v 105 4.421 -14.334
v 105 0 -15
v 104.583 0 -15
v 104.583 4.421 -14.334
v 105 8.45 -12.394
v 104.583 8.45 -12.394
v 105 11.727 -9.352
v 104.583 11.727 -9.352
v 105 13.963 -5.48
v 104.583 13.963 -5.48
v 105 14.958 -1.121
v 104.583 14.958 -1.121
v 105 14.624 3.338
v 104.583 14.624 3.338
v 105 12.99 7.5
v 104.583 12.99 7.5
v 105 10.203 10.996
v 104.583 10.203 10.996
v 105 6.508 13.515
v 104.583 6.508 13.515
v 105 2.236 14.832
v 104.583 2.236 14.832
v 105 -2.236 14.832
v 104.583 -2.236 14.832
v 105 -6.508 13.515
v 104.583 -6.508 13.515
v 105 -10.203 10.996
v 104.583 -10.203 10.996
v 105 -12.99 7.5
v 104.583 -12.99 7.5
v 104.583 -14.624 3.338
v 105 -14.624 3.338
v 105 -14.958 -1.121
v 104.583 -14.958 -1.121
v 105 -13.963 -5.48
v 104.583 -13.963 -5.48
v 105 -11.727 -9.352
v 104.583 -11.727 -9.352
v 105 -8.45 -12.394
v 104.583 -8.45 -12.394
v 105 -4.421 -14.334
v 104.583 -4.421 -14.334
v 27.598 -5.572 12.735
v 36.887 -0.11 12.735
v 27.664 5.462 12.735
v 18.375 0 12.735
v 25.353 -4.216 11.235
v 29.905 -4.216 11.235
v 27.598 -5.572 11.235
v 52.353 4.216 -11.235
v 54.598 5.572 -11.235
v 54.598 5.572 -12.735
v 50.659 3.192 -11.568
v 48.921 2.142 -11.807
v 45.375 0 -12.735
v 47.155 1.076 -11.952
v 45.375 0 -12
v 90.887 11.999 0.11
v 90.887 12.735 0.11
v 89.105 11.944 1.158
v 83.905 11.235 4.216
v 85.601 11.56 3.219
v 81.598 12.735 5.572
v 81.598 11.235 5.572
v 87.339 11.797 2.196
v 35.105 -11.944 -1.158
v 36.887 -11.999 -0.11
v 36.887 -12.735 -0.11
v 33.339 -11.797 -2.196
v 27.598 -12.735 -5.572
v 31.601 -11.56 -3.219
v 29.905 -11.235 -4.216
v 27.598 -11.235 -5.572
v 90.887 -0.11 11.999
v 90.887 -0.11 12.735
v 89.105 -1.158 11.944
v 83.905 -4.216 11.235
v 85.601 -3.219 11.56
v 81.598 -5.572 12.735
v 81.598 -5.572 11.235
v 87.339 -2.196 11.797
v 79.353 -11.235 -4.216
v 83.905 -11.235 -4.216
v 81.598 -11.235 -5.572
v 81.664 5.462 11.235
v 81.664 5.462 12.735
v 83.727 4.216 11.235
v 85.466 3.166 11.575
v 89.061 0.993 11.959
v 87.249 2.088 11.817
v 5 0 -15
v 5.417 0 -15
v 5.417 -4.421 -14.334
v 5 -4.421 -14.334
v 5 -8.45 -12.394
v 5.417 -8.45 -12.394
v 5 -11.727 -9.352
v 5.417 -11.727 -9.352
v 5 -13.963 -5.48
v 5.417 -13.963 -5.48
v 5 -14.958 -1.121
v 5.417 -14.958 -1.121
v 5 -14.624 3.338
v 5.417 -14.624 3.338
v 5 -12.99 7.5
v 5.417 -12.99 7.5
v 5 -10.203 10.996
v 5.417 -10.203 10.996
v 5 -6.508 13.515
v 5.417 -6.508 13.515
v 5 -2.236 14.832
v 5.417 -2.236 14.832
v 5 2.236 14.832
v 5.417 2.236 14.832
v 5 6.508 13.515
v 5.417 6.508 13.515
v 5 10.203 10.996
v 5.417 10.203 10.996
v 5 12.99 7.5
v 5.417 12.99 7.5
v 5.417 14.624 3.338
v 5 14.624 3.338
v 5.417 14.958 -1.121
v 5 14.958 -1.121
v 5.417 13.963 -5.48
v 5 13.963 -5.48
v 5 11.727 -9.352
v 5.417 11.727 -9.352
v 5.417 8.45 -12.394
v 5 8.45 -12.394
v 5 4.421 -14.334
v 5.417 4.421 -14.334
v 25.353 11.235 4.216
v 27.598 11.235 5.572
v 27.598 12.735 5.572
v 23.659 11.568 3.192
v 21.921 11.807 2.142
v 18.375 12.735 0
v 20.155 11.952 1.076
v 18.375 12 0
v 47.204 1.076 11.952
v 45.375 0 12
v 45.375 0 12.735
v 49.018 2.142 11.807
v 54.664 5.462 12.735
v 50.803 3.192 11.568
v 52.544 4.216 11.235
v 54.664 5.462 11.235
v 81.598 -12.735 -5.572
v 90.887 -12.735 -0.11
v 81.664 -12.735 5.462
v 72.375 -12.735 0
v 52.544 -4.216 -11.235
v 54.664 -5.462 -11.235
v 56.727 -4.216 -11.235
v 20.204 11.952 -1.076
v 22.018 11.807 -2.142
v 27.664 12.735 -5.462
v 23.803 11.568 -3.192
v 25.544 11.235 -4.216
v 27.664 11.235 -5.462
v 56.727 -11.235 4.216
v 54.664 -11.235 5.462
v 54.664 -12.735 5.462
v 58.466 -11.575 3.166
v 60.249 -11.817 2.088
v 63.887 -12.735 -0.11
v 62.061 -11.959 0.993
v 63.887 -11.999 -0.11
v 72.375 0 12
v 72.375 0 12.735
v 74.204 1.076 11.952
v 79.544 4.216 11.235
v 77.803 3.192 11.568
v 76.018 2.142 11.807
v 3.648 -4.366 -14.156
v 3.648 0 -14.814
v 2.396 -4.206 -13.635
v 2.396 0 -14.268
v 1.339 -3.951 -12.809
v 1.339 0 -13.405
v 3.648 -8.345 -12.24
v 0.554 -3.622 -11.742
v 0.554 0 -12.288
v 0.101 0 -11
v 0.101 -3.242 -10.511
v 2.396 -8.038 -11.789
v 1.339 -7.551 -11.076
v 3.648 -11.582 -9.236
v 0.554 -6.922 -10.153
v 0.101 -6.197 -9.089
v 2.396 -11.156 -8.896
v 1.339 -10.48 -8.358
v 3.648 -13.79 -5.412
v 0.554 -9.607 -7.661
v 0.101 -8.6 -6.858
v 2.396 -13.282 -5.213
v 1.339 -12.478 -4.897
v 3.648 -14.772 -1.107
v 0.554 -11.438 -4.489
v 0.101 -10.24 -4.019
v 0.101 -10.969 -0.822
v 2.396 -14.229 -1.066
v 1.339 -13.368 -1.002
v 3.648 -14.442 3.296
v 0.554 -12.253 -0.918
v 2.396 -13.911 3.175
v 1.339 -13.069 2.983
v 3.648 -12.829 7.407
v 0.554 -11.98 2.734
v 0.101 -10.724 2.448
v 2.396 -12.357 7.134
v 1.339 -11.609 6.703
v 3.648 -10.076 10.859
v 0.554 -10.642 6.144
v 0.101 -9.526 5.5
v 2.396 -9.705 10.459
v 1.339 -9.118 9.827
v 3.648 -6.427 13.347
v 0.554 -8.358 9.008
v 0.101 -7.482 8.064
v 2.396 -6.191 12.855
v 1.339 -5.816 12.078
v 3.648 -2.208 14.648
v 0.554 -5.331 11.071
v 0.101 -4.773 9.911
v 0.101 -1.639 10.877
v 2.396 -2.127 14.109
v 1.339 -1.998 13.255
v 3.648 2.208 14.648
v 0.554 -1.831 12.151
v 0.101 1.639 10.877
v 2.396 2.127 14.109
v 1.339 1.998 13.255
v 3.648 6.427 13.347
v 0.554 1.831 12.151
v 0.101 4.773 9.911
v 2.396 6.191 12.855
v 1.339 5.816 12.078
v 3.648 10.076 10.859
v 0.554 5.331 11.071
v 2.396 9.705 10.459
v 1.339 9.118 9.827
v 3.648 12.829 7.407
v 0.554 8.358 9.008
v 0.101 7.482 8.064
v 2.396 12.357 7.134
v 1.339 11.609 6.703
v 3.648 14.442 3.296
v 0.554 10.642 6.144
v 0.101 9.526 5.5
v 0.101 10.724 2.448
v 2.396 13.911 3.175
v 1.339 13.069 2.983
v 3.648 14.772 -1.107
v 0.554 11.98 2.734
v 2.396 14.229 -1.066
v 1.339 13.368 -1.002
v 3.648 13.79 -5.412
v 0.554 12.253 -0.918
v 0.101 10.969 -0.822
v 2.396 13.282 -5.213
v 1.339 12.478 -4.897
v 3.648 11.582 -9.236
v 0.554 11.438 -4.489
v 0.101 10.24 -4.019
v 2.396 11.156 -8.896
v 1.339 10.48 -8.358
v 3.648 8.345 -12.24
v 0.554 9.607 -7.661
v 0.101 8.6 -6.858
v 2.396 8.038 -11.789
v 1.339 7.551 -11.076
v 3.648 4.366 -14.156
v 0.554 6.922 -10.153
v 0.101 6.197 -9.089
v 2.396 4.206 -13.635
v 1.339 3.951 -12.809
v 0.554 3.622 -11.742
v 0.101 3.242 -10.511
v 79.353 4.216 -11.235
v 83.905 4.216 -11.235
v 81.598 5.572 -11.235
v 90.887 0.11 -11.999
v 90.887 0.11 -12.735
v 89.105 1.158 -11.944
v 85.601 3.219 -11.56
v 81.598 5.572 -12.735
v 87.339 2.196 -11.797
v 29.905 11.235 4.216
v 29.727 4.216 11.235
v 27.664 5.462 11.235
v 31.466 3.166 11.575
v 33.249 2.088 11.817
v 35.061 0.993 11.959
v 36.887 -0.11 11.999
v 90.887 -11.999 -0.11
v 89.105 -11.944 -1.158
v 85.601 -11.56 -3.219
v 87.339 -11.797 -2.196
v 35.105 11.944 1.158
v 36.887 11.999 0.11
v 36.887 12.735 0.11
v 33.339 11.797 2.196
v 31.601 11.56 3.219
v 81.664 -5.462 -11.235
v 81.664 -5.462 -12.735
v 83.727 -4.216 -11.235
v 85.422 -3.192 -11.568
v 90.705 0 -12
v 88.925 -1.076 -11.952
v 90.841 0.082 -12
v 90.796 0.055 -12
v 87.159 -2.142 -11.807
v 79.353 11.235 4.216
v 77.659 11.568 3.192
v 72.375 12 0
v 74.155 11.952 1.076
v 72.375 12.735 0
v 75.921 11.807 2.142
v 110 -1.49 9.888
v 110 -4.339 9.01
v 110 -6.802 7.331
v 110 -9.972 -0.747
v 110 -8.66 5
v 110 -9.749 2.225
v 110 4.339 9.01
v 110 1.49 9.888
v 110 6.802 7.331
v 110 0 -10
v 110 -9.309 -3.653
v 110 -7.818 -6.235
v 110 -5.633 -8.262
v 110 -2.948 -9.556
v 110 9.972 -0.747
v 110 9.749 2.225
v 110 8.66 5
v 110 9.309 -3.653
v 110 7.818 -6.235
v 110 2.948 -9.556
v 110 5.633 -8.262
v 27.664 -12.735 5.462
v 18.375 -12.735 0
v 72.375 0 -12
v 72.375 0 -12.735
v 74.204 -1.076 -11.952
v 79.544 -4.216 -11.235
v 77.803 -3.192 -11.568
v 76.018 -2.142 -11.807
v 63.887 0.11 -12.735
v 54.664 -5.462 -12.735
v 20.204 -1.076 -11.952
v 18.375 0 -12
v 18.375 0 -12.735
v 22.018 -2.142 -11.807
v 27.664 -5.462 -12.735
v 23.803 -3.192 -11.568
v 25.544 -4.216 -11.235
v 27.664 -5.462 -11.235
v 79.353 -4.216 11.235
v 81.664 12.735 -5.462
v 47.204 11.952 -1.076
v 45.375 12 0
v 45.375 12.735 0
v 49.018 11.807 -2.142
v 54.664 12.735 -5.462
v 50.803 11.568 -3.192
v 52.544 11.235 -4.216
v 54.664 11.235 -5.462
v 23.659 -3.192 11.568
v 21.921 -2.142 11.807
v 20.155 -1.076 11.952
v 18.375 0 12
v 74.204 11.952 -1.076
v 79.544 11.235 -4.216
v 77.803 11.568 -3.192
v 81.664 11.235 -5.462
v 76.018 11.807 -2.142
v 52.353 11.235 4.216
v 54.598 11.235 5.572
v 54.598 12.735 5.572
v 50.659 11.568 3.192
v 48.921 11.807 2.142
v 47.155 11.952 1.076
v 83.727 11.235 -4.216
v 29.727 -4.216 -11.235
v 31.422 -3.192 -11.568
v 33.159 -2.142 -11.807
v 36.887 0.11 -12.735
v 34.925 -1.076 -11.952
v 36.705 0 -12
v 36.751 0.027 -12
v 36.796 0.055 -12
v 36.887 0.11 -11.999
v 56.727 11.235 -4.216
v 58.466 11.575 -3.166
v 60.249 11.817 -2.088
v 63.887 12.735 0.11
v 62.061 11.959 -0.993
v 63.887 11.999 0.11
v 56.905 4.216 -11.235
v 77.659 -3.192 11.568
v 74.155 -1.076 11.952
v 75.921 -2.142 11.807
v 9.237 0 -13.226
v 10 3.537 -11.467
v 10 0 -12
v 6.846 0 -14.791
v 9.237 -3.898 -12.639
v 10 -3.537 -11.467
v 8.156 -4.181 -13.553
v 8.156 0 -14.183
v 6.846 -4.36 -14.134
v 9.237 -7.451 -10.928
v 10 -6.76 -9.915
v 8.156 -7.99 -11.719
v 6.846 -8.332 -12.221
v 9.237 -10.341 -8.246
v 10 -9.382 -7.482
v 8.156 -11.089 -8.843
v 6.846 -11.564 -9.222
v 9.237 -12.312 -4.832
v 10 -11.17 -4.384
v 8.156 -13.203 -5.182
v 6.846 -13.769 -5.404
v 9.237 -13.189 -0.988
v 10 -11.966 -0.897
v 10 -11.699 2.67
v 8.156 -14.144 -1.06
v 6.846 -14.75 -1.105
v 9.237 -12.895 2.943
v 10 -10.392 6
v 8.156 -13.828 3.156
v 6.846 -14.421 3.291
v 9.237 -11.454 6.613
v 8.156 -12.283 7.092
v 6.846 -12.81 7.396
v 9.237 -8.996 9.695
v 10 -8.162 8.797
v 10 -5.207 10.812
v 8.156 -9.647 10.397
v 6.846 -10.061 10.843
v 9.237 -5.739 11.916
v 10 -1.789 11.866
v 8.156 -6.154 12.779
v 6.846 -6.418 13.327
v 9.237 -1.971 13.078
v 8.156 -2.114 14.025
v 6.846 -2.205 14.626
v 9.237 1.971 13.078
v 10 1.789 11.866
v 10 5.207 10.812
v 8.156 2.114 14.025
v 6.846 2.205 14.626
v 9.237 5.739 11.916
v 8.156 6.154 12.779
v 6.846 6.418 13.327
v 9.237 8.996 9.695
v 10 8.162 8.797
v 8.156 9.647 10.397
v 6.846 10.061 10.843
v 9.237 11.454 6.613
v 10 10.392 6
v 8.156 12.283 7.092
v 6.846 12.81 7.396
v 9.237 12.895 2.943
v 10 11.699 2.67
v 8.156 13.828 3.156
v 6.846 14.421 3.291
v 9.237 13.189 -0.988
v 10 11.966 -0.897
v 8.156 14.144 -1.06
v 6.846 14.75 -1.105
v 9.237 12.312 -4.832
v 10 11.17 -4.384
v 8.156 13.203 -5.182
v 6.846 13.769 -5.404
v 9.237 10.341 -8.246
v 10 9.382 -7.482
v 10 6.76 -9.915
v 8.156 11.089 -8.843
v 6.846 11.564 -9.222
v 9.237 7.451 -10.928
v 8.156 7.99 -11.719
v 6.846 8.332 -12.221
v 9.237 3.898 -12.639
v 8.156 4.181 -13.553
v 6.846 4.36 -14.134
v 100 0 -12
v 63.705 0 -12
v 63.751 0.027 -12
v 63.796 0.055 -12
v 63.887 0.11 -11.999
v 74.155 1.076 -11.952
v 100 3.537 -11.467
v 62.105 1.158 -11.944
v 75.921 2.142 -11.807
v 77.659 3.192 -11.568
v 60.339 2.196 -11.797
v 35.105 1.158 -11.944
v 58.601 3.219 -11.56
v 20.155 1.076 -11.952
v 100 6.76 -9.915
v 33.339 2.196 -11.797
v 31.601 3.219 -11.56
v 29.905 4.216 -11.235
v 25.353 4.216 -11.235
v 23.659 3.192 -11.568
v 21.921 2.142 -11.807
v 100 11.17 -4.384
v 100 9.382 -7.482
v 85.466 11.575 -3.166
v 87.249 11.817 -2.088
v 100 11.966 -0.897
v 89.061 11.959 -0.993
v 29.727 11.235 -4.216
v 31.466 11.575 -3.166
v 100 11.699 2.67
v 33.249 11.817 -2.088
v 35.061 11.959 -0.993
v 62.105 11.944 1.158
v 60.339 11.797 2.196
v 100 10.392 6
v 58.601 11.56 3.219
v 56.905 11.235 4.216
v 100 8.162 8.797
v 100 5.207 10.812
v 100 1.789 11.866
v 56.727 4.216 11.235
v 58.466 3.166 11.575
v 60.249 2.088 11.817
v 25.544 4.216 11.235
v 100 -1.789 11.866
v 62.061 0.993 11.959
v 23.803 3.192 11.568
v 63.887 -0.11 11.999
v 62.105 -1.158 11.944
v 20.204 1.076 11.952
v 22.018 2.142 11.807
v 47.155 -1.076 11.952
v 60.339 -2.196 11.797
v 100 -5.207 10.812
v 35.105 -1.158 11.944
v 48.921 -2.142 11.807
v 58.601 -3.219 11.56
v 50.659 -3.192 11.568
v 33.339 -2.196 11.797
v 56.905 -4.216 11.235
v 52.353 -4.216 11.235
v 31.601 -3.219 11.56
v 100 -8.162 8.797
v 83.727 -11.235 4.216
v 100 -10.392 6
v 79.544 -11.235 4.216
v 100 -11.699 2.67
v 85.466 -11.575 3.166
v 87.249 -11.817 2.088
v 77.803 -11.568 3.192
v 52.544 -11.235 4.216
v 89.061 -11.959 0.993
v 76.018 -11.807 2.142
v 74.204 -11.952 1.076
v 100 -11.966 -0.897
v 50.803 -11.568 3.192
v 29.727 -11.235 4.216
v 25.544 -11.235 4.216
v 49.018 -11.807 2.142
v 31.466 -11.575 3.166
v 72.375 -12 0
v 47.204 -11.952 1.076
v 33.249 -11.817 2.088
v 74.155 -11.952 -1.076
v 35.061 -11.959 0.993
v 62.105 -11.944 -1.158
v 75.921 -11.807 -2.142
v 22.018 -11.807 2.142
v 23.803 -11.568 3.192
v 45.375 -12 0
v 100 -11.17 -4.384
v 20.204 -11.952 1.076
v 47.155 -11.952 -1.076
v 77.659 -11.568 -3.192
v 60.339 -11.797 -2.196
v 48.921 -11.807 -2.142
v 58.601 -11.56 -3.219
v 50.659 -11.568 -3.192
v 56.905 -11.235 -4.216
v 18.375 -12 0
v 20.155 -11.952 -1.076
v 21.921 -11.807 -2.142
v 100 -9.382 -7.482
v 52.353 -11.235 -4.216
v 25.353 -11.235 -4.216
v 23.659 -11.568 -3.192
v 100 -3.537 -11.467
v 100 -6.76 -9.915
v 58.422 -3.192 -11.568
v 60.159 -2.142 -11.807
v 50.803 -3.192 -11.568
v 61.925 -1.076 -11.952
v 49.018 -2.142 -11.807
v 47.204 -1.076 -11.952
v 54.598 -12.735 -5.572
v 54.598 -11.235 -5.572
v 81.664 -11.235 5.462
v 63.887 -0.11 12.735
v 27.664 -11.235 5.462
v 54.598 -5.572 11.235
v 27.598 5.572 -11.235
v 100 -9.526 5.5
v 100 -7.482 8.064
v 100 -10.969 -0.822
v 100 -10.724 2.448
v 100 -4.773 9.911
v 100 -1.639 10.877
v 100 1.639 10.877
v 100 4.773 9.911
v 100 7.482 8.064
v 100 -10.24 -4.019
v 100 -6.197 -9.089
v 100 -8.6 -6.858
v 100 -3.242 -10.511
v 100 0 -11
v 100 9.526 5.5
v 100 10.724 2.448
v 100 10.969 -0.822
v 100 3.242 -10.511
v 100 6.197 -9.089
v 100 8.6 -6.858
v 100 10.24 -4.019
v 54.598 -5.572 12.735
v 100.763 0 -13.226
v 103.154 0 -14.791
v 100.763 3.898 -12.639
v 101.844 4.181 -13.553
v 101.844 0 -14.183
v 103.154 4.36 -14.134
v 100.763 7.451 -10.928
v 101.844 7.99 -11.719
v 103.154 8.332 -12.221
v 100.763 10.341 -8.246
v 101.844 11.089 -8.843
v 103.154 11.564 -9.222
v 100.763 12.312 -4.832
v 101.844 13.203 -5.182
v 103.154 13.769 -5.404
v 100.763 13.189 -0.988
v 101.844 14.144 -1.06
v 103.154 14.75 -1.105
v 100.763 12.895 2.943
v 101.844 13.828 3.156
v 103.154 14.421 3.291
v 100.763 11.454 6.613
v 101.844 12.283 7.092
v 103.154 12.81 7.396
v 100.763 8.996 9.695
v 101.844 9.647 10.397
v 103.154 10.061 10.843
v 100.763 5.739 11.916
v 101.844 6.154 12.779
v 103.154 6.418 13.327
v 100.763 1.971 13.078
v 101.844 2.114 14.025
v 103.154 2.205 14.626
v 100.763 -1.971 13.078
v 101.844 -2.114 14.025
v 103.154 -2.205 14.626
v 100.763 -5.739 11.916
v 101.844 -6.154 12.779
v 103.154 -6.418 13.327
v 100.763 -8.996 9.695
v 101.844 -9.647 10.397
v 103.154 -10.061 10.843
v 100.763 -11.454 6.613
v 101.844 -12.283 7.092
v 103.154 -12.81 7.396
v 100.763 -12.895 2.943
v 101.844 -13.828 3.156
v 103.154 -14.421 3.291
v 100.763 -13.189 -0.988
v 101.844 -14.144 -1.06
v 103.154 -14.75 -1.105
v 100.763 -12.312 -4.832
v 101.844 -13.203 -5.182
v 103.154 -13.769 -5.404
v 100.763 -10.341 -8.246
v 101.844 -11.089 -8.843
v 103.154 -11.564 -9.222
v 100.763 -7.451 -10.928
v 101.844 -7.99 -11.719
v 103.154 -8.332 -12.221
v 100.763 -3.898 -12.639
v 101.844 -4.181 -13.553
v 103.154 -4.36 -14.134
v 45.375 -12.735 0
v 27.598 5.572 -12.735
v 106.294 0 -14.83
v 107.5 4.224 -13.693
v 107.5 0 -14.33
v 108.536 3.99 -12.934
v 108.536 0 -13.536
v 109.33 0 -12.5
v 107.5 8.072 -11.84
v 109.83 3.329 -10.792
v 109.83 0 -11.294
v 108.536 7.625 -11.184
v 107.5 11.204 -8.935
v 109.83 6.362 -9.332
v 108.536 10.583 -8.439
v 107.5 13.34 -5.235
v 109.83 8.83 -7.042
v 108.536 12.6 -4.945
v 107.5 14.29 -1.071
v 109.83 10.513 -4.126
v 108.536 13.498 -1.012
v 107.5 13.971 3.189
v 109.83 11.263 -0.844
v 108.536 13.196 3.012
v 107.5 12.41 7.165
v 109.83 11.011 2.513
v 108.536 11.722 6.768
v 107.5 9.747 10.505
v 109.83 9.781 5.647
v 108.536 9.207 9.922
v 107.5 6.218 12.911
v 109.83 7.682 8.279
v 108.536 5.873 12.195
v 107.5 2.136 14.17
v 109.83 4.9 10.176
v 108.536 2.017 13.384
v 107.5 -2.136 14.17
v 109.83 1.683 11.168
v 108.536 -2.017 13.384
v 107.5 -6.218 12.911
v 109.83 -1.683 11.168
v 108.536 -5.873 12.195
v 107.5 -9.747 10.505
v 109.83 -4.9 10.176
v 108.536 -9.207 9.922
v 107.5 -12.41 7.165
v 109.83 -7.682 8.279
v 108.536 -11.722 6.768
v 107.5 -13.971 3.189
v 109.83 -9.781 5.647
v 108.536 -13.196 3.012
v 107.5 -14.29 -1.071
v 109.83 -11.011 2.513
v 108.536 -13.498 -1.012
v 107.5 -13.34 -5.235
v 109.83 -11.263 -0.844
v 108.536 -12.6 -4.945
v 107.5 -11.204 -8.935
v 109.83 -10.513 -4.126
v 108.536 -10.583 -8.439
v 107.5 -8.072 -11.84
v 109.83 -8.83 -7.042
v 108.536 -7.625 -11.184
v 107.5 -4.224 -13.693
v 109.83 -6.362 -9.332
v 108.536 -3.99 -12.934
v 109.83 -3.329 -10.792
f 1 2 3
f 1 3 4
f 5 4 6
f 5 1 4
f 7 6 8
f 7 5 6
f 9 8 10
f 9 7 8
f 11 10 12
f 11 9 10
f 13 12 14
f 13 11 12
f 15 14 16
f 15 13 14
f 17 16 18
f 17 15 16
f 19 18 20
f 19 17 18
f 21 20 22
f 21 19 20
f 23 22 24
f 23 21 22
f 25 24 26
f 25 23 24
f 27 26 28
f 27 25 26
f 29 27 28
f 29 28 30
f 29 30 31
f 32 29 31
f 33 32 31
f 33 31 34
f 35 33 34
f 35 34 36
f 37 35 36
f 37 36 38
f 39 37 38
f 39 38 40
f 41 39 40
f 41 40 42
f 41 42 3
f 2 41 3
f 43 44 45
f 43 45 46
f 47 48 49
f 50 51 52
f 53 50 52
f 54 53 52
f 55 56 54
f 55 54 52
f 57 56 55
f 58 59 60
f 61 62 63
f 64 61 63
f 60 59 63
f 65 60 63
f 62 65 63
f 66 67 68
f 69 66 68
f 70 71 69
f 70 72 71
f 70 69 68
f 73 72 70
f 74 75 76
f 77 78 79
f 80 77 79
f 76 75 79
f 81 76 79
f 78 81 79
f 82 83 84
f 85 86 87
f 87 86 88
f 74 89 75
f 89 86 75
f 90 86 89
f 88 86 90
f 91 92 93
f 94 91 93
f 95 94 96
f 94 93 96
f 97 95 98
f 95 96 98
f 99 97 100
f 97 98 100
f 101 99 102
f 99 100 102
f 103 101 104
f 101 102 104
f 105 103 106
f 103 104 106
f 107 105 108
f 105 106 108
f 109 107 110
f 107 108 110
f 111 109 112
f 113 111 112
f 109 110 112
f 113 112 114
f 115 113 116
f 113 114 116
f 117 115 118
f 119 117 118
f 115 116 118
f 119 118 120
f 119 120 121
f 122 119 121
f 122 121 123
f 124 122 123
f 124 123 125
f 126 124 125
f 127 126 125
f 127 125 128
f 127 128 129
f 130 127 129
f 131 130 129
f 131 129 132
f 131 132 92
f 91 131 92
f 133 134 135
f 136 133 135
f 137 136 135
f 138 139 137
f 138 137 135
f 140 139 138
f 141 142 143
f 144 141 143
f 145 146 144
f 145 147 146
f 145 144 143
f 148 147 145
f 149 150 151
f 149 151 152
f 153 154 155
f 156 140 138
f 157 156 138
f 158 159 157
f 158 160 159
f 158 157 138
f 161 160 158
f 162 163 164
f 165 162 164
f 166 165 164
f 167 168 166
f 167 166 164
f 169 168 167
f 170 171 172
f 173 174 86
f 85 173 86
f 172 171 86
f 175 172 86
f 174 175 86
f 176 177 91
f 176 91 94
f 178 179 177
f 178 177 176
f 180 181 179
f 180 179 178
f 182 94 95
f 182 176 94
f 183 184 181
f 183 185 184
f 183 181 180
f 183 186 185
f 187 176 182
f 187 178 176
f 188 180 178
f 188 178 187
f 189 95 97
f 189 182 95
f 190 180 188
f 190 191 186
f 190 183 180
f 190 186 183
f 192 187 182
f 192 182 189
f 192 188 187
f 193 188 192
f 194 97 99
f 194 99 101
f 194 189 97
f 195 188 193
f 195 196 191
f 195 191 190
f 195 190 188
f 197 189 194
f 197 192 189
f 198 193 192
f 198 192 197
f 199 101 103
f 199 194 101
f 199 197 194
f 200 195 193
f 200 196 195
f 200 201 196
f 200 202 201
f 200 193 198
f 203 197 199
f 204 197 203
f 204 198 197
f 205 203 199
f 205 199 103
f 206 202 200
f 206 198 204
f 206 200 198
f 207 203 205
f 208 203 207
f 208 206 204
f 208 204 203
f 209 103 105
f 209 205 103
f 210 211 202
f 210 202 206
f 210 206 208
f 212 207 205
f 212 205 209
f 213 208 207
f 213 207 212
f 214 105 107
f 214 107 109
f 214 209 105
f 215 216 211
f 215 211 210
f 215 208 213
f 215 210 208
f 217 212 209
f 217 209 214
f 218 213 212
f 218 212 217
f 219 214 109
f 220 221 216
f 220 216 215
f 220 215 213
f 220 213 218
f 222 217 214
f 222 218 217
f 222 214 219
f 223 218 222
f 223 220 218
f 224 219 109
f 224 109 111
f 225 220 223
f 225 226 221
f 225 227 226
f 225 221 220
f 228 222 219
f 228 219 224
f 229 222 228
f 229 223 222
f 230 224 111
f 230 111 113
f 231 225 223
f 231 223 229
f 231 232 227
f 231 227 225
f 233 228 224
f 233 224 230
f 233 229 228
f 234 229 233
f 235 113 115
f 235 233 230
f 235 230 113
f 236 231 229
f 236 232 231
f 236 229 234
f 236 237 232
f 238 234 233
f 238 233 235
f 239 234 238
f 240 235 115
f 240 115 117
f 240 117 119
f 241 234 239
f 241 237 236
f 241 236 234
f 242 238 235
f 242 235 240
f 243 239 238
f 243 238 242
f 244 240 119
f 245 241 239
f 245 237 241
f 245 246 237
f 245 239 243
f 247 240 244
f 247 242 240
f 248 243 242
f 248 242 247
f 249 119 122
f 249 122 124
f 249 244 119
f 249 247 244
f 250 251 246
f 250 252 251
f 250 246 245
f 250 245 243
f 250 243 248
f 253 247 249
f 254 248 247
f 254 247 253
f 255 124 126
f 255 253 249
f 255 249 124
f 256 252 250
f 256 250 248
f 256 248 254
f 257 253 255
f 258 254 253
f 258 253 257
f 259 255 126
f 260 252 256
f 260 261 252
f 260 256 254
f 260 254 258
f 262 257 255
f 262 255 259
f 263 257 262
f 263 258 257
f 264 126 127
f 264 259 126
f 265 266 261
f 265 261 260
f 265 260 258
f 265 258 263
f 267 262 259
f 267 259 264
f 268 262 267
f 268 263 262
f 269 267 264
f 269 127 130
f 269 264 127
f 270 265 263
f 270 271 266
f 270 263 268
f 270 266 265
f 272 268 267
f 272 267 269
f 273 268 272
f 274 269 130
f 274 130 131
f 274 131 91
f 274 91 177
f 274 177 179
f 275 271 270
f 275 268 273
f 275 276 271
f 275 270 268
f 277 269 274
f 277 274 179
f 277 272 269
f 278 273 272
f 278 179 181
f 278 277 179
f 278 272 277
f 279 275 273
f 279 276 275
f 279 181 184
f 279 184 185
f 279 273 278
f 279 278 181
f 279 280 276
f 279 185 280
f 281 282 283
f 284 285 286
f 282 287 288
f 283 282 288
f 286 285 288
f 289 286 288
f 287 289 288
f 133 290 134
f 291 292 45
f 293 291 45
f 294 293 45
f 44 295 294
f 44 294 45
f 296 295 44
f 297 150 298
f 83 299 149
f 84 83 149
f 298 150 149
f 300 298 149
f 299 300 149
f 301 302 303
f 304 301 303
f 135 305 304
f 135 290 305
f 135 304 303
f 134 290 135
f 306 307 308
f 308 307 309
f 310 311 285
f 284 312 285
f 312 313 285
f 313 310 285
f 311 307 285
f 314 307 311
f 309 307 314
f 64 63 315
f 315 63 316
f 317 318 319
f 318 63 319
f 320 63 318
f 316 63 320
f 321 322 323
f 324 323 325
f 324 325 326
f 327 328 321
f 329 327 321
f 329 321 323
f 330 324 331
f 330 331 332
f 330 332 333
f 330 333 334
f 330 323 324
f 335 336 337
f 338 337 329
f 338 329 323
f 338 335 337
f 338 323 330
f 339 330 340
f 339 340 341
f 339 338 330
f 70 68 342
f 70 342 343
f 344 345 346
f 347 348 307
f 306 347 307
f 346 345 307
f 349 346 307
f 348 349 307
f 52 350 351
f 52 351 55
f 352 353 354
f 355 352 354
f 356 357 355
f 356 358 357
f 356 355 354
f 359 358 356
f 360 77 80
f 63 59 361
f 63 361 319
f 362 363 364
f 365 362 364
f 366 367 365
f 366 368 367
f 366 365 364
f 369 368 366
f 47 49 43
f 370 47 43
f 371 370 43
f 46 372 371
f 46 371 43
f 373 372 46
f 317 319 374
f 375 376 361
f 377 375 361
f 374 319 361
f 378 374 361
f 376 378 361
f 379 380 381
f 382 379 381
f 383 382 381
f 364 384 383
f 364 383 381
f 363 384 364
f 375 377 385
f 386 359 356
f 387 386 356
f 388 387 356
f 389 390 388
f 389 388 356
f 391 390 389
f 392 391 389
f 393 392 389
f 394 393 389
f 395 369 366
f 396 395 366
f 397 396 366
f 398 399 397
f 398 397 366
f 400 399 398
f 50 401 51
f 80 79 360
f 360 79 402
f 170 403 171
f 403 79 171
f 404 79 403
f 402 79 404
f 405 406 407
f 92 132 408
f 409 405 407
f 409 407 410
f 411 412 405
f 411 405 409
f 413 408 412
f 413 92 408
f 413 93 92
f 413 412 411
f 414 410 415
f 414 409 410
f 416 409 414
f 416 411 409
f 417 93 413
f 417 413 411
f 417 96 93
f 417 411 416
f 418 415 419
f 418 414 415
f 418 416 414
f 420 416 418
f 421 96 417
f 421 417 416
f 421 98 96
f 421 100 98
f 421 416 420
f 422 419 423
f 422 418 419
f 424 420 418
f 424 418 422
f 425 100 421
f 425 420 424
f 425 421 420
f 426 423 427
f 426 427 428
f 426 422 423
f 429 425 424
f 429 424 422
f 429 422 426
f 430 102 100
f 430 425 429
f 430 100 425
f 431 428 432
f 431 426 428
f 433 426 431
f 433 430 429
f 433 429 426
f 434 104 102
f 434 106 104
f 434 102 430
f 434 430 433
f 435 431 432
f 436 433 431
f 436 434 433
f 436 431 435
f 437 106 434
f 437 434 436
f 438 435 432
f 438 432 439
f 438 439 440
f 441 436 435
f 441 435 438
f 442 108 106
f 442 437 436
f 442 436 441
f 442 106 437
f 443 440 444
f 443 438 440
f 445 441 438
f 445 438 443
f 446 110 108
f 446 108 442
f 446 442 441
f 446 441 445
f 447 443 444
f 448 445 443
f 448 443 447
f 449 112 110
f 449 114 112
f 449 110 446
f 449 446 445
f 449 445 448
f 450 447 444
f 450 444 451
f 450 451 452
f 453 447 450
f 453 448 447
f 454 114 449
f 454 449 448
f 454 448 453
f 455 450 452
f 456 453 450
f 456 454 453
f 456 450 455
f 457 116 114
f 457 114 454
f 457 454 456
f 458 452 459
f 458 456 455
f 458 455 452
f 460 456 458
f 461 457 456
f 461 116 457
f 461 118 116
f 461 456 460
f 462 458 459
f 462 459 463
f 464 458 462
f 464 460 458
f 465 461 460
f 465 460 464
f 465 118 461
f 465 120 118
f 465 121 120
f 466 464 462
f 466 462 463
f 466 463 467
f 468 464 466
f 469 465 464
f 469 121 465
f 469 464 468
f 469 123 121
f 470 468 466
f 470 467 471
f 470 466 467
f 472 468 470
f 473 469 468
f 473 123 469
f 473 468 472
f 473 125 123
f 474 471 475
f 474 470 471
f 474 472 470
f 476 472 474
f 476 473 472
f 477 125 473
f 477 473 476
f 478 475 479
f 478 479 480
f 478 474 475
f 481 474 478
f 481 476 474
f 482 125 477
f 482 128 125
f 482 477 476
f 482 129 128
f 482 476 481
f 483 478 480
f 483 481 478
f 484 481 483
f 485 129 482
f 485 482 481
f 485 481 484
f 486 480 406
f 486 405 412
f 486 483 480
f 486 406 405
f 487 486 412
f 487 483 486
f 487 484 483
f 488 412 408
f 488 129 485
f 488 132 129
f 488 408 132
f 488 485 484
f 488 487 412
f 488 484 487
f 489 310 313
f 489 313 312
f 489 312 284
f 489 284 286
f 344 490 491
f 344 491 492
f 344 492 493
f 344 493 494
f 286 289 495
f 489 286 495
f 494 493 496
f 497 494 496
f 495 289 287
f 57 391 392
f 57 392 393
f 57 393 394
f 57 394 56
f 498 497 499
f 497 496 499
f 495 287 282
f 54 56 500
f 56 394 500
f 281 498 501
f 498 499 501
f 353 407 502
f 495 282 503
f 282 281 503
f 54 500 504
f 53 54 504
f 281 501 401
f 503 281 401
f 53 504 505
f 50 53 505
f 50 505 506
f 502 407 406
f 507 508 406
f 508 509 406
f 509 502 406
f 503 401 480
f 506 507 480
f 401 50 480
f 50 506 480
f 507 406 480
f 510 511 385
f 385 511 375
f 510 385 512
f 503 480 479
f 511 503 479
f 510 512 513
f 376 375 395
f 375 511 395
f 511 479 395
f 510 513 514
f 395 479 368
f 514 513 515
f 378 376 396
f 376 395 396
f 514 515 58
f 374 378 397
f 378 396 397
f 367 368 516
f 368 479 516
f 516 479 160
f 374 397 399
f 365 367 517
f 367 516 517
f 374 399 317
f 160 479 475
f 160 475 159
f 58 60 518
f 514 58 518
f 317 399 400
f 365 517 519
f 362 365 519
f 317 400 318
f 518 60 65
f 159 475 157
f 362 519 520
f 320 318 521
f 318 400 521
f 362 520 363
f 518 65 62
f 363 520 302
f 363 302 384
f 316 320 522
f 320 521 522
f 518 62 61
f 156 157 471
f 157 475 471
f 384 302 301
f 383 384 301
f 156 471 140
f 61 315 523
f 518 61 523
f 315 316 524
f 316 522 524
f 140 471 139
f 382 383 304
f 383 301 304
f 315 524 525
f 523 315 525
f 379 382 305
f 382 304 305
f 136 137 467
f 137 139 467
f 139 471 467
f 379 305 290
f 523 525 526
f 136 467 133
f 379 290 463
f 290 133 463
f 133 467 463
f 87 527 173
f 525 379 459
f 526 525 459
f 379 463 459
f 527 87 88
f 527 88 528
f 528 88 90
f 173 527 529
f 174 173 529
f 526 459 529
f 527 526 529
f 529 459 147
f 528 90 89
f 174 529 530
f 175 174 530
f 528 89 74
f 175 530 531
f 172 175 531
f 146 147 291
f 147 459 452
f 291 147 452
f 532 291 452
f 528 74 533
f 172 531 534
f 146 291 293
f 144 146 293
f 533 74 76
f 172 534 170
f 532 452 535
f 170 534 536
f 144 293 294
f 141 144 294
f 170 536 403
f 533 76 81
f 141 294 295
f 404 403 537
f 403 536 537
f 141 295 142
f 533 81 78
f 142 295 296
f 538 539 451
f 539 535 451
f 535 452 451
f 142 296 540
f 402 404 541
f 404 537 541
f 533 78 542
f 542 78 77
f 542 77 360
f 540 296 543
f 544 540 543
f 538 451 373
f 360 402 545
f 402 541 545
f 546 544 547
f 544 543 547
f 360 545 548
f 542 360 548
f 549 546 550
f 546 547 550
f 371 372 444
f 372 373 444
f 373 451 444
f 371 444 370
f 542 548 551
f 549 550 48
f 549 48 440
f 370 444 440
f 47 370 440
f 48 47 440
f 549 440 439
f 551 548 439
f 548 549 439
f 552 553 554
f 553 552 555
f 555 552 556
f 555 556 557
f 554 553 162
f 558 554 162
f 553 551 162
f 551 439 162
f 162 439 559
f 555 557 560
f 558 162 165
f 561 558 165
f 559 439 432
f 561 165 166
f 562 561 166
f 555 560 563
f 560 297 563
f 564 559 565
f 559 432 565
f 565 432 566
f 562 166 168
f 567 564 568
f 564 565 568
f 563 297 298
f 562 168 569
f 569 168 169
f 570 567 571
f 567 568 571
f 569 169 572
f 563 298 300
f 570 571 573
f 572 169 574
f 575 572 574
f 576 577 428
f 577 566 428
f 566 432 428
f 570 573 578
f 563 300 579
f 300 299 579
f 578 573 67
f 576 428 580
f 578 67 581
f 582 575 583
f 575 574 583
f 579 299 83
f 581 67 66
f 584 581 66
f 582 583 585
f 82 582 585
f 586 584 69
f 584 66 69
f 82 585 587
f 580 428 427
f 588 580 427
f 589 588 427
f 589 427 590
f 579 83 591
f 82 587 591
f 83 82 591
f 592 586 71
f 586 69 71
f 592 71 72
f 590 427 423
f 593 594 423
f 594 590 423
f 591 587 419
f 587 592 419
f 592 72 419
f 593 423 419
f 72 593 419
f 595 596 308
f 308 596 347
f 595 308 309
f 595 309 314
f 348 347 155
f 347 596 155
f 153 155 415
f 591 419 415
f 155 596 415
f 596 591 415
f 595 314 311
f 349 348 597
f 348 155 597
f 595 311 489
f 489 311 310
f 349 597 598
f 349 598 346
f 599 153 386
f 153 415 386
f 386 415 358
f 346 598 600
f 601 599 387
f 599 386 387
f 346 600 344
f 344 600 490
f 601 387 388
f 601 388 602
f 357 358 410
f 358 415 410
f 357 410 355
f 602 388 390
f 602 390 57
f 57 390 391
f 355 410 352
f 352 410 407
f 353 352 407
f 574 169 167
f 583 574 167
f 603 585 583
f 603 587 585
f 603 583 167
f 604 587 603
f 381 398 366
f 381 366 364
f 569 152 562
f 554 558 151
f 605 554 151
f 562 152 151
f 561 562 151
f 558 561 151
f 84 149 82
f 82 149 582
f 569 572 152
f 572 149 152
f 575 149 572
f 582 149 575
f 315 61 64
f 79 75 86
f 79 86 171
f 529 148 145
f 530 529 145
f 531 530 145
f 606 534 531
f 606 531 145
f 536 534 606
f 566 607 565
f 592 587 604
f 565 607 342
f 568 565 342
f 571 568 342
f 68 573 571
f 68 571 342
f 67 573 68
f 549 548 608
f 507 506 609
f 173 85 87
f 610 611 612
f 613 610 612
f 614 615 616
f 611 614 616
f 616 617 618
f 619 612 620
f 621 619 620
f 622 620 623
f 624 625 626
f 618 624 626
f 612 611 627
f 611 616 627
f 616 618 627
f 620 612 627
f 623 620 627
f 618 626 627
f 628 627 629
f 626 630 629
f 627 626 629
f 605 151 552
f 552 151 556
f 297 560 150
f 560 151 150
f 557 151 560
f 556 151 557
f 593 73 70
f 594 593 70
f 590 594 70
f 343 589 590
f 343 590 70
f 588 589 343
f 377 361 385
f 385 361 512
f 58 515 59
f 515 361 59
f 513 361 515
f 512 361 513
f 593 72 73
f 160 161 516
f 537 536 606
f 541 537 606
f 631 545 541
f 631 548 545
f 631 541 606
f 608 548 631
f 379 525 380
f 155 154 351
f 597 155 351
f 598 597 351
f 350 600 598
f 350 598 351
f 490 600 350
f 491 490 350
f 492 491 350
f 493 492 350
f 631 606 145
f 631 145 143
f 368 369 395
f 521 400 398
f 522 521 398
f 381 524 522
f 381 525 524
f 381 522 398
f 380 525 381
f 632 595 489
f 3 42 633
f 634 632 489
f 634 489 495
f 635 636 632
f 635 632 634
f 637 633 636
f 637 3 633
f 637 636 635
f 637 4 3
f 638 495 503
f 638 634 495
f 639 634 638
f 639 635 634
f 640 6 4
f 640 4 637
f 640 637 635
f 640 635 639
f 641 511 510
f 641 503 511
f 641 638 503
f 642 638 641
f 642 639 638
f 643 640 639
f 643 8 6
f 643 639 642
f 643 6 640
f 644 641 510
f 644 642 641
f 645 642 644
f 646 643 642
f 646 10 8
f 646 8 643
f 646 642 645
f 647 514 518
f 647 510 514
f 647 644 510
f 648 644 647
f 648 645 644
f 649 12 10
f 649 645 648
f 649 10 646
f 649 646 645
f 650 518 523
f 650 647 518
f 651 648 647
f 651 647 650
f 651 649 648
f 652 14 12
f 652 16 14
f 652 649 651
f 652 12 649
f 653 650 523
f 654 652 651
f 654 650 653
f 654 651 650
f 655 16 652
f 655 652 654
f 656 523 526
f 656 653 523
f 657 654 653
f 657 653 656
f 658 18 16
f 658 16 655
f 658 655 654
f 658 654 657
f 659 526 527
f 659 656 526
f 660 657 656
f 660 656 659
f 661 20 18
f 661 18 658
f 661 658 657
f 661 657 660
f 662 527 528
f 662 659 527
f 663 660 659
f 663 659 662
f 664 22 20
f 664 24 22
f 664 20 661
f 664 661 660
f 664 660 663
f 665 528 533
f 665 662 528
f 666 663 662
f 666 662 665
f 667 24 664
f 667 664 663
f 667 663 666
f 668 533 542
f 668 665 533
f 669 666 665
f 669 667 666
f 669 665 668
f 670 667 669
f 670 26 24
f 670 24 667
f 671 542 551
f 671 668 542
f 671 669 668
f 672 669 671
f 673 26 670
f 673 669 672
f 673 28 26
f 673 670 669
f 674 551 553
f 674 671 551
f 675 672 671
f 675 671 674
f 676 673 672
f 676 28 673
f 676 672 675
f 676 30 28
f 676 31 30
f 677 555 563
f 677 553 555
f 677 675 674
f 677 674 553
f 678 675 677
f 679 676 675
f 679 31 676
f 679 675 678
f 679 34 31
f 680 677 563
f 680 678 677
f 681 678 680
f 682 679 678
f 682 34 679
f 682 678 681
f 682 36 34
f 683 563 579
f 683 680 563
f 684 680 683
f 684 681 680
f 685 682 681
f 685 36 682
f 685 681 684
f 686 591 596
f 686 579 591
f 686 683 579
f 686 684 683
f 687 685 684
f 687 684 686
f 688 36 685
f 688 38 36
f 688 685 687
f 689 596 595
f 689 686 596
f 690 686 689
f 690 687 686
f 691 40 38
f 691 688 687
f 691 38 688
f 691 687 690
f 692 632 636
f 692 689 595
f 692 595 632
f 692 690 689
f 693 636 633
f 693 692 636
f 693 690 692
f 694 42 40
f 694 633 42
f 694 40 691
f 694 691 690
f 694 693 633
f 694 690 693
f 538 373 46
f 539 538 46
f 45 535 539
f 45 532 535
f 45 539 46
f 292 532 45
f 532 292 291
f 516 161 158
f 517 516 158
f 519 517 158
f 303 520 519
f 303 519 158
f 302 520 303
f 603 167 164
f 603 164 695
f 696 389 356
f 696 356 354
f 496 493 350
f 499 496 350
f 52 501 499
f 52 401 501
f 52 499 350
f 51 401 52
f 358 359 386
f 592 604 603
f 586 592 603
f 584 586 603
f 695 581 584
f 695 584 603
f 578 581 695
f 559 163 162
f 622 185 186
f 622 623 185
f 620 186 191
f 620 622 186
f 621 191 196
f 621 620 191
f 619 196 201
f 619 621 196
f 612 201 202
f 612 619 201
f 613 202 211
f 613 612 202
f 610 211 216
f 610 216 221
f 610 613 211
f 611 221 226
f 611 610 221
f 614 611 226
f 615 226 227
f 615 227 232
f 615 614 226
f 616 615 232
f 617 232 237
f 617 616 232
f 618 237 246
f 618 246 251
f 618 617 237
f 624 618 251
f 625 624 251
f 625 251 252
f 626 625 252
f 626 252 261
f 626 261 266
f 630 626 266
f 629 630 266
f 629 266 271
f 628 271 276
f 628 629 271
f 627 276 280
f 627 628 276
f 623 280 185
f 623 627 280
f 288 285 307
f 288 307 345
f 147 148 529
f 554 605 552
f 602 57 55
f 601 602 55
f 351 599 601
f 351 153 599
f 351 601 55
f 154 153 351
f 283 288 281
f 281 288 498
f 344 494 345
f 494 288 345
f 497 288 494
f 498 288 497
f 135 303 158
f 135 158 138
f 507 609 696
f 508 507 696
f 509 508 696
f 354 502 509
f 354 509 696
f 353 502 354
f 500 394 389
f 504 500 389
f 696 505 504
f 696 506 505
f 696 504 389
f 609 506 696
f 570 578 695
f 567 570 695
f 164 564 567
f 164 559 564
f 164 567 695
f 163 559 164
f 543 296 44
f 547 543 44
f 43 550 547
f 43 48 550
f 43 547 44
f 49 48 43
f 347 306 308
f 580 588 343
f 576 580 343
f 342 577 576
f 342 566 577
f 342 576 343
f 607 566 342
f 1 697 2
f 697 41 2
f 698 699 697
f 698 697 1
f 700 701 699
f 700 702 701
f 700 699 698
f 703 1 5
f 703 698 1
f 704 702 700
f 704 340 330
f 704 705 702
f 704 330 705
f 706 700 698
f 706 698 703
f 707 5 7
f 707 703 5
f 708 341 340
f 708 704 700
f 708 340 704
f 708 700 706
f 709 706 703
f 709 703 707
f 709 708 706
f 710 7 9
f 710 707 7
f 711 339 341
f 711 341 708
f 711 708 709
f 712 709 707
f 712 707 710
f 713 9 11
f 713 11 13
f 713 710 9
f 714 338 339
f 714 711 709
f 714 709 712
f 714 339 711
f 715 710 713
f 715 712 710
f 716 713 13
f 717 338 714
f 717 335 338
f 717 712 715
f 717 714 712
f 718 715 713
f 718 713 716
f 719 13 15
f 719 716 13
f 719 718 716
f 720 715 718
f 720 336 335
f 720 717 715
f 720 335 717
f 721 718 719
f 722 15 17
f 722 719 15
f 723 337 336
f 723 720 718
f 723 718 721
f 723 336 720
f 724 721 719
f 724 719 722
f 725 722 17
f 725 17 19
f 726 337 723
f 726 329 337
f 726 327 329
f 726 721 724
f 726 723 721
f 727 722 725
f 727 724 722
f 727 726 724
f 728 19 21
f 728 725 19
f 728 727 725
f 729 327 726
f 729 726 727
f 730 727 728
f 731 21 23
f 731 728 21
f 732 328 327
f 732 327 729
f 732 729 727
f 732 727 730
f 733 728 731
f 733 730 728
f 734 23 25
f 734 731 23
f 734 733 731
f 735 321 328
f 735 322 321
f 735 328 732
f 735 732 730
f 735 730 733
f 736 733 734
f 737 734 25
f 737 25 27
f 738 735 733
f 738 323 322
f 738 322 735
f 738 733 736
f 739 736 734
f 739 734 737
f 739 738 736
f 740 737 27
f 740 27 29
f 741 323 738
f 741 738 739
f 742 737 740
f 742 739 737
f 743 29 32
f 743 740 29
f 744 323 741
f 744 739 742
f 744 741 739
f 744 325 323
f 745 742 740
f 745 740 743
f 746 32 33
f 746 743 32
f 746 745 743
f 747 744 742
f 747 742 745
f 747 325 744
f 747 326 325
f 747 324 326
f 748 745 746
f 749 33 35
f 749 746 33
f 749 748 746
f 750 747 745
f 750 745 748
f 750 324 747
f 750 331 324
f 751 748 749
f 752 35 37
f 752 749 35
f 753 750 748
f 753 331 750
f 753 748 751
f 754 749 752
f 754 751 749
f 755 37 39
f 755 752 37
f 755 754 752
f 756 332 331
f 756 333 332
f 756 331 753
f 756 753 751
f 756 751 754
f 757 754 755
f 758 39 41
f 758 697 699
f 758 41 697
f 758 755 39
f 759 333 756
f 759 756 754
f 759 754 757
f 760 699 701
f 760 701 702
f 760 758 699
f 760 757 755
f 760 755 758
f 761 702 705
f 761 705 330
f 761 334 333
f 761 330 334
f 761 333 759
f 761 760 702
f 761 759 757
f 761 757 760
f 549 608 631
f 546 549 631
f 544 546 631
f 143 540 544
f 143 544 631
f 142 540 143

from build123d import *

# Parameters (mm, degrees)
CROQUIS1_R              = 12
SALIENTE_EXTRUIR1_DEPTH = 110
CROQUIS3_R              = 11
CORTAR_EXTRUIR1_DEPTH   = 110
CROQUIS4_R              = 15
SALIENTE_EXTRUIR3_DEPTH = 10
REDONDEO1_R             = 5
SALIENTE_EXTRUIR4_START = -10
CROQUIS5_R              = 15
SALIENTE_EXTRUIR4_DEPTH = 10
REDONDEO2_R             = 5
CORTAR_EXTRUIR2_START   = -100
CROQUIS7_R              = 11
CORTAR_EXTRUIR2_DEPTH   = 100
SALIENTE_EXTRUIR5_DEPTH = 0.75
MATRIZC1_COUNT          = 4


with BuildPart() as part:
    # Croquis1 → Saliente-Extruir1 (new body)
    with BuildSketch(Plane(origin=(0, 0, 0), x_dir=(0, 0, -1), z_dir=(1, 0, 0))):
        Circle(CROQUIS1_R)
    extrude(amount=SALIENTE_EXTRUIR1_DEPTH)

    # Croquis3 → Cortar-Extruir1 (cut)
    with BuildSketch(Plane(origin=(110, 0, 0), x_dir=(0, 0, -1), z_dir=(1, 0, 0))):
        Circle(CROQUIS3_R)
    extrude(amount=-CORTAR_EXTRUIR1_DEPTH, mode=Mode.SUBTRACT)

    # Croquis4 → Saliente-Extruir3 (add)
    with BuildSketch(Plane(origin=(110, 0, 0), x_dir=(0, 0, -1), z_dir=(1, 0, 0))):
        Circle(CROQUIS4_R)
    extrude(amount=-SALIENTE_EXTRUIR3_DEPTH)

    # Redondeo1
    # the kernel refuses this fillet: 5 mm, written as the material it takes off along each edge
    with BuildSketch(Plane(origin=(110, 0, 0), x_dir=(0, 0, -1), z_dir=(0, -1, 0))) as redondeo1_piece_1:
        with BuildLine():
            CenterArc((15 - REDONDEO1_R, -REDONDEO1_R), REDONDEO1_R, 0, 90)
            Line((15 - REDONDEO1_R, 0), (15 - REDONDEO1_R, REDONDEO1_R * 0.02))
            Line((15 - REDONDEO1_R, REDONDEO1_R * 0.02), (15 + REDONDEO1_R * 0.02, REDONDEO1_R * 0.02))
            Line((15 + REDONDEO1_R * 0.02, REDONDEO1_R * 0.02), (15 + REDONDEO1_R * 0.02, -REDONDEO1_R))
            Line((15 + REDONDEO1_R * 0.02, -REDONDEO1_R), (15, -REDONDEO1_R))
        make_face()
    revolve(axis=Axis((110, 0, 0), (1, 0, 0)), mode=Mode.SUBTRACT)
    with BuildSketch(Plane(origin=(100, 0, 0), x_dir=(0, 0, -1), z_dir=(0, -1, 0))) as redondeo1_piece_2:
        with BuildLine():
            CenterArc((10, 4.582575695), REDONDEO1_R, 293.578178478, 66.421821522)
            Line((15, 4.582575695), (15.1, 4.582575695))
            Line((15.1, 4.582575695), (15.1, 0))
            Line((15.1, 0), (15, -0.1))
            ThreePointArc((15, -0.1), (13.5, -0.1), (12.04, -0.091651514))
            Line((12.04, -0.091651514), (12, 0))
        make_face()
    revolve(axis=Axis((100, 0, 0), (1, 0, 0)), mode=Mode.SUBTRACT)

    # Croquis5 → Saliente-Extruir4 (add)
    with BuildSketch(Plane.ZY.offset(SALIENTE_EXTRUIR4_START)):
        with Locations(Location((0, 0, 0), (0, 0, 180))):
            Circle(CROQUIS5_R)
    extrude(amount=SALIENTE_EXTRUIR4_DEPTH)

    # Redondeo2
    # the kernel refuses this fillet: 5 mm, written as the material it takes off along each edge
    with BuildSketch(Plane(origin=(0, 0, 0), x_dir=(0, 0, -1), z_dir=(0, 1, 0))) as redondeo2_piece_1:
        with BuildLine():
            CenterArc((15 - REDONDEO2_R, -REDONDEO2_R), REDONDEO2_R, 0, 90)
            Line((15, -REDONDEO2_R), (15 + REDONDEO2_R * 0.02, -REDONDEO2_R))
            Line((15 + REDONDEO2_R * 0.02, -REDONDEO2_R), (15 + REDONDEO2_R * 0.02, REDONDEO2_R * 0.02))
            Line((15 + REDONDEO2_R * 0.02, REDONDEO2_R * 0.02), (15 - REDONDEO2_R, REDONDEO2_R * 0.02))
            Line((15 - REDONDEO2_R, REDONDEO2_R * 0.02), (15 - REDONDEO2_R, 0))
        make_face()
    revolve(axis=Axis((0, 0, 0), (-1, 0, 0)), mode=Mode.SUBTRACT)
    with BuildSketch(Plane(origin=(10, 0, 0), x_dir=(0, 0, -1), z_dir=(0, 1, 0))) as redondeo2_piece_2:
        with BuildLine():
            CenterArc((10, 4.582575695), REDONDEO2_R, 293.578178478, 66.421821522)
            Line((12, 0), (12.04, -0.091651514))
            ThreePointArc((12.04, -0.091651514), (13.5, -0.1), (15, -0.1))
            Line((15, -0.1), (15.1, 0))
            Line((15.1, 0), (15.1, 4.582575695))
            Line((15.1, 4.582575695), (15, 4.582575695))
        make_face()
    revolve(axis=Axis((10, 0, 0), (-1, 0, 0)), mode=Mode.SUBTRACT)

    # Croquis7 → Cortar-Extruir2 (cut)
    with BuildSketch(Plane.ZY.offset(CORTAR_EXTRUIR2_START)):
        with Locations(Location((0, 0, 0), (0, 0, 180))):
            Circle(CROQUIS7_R)
    extrude(amount=CORTAR_EXTRUIR2_DEPTH, mode=Mode.SUBTRACT)

    # Croquis9 → Saliente-Extruir5 (add, symmetric)
    with BuildSketch(Plane.XY.offset(11.985010852)):
        Polygon((18.375194252, 0), (27.66376902, 5.462495064), (36.886888429, -0.109806246), (27.598313662, -5.57230131), align=None)
        Polygon((45.375194252, 0), (54.66376902, 5.462495064), (63.886888429, -0.109806246), (54.598313662, -5.57230131), align=None)
        Polygon((72.375194252, 0), (81.66376902, 5.462495064), (90.886888429, -0.109806246), (81.598313662, -5.57230131), align=None)
    saliente_extruir5 = extrude(amount=SALIENTE_EXTRUIR5_DEPTH, both=True)

    # MatrizC1: Saliente-Extruir5 ×4 about axis
    matrizc1_axis = Axis((0, 0, 0), (1, 0, 0))
    for i in range(1, MATRIZC1_COUNT):
        add(saliente_extruir5.rotate(matrizc1_axis, i * 360 / MATRIZC1_COUNT))


solid = part.part
